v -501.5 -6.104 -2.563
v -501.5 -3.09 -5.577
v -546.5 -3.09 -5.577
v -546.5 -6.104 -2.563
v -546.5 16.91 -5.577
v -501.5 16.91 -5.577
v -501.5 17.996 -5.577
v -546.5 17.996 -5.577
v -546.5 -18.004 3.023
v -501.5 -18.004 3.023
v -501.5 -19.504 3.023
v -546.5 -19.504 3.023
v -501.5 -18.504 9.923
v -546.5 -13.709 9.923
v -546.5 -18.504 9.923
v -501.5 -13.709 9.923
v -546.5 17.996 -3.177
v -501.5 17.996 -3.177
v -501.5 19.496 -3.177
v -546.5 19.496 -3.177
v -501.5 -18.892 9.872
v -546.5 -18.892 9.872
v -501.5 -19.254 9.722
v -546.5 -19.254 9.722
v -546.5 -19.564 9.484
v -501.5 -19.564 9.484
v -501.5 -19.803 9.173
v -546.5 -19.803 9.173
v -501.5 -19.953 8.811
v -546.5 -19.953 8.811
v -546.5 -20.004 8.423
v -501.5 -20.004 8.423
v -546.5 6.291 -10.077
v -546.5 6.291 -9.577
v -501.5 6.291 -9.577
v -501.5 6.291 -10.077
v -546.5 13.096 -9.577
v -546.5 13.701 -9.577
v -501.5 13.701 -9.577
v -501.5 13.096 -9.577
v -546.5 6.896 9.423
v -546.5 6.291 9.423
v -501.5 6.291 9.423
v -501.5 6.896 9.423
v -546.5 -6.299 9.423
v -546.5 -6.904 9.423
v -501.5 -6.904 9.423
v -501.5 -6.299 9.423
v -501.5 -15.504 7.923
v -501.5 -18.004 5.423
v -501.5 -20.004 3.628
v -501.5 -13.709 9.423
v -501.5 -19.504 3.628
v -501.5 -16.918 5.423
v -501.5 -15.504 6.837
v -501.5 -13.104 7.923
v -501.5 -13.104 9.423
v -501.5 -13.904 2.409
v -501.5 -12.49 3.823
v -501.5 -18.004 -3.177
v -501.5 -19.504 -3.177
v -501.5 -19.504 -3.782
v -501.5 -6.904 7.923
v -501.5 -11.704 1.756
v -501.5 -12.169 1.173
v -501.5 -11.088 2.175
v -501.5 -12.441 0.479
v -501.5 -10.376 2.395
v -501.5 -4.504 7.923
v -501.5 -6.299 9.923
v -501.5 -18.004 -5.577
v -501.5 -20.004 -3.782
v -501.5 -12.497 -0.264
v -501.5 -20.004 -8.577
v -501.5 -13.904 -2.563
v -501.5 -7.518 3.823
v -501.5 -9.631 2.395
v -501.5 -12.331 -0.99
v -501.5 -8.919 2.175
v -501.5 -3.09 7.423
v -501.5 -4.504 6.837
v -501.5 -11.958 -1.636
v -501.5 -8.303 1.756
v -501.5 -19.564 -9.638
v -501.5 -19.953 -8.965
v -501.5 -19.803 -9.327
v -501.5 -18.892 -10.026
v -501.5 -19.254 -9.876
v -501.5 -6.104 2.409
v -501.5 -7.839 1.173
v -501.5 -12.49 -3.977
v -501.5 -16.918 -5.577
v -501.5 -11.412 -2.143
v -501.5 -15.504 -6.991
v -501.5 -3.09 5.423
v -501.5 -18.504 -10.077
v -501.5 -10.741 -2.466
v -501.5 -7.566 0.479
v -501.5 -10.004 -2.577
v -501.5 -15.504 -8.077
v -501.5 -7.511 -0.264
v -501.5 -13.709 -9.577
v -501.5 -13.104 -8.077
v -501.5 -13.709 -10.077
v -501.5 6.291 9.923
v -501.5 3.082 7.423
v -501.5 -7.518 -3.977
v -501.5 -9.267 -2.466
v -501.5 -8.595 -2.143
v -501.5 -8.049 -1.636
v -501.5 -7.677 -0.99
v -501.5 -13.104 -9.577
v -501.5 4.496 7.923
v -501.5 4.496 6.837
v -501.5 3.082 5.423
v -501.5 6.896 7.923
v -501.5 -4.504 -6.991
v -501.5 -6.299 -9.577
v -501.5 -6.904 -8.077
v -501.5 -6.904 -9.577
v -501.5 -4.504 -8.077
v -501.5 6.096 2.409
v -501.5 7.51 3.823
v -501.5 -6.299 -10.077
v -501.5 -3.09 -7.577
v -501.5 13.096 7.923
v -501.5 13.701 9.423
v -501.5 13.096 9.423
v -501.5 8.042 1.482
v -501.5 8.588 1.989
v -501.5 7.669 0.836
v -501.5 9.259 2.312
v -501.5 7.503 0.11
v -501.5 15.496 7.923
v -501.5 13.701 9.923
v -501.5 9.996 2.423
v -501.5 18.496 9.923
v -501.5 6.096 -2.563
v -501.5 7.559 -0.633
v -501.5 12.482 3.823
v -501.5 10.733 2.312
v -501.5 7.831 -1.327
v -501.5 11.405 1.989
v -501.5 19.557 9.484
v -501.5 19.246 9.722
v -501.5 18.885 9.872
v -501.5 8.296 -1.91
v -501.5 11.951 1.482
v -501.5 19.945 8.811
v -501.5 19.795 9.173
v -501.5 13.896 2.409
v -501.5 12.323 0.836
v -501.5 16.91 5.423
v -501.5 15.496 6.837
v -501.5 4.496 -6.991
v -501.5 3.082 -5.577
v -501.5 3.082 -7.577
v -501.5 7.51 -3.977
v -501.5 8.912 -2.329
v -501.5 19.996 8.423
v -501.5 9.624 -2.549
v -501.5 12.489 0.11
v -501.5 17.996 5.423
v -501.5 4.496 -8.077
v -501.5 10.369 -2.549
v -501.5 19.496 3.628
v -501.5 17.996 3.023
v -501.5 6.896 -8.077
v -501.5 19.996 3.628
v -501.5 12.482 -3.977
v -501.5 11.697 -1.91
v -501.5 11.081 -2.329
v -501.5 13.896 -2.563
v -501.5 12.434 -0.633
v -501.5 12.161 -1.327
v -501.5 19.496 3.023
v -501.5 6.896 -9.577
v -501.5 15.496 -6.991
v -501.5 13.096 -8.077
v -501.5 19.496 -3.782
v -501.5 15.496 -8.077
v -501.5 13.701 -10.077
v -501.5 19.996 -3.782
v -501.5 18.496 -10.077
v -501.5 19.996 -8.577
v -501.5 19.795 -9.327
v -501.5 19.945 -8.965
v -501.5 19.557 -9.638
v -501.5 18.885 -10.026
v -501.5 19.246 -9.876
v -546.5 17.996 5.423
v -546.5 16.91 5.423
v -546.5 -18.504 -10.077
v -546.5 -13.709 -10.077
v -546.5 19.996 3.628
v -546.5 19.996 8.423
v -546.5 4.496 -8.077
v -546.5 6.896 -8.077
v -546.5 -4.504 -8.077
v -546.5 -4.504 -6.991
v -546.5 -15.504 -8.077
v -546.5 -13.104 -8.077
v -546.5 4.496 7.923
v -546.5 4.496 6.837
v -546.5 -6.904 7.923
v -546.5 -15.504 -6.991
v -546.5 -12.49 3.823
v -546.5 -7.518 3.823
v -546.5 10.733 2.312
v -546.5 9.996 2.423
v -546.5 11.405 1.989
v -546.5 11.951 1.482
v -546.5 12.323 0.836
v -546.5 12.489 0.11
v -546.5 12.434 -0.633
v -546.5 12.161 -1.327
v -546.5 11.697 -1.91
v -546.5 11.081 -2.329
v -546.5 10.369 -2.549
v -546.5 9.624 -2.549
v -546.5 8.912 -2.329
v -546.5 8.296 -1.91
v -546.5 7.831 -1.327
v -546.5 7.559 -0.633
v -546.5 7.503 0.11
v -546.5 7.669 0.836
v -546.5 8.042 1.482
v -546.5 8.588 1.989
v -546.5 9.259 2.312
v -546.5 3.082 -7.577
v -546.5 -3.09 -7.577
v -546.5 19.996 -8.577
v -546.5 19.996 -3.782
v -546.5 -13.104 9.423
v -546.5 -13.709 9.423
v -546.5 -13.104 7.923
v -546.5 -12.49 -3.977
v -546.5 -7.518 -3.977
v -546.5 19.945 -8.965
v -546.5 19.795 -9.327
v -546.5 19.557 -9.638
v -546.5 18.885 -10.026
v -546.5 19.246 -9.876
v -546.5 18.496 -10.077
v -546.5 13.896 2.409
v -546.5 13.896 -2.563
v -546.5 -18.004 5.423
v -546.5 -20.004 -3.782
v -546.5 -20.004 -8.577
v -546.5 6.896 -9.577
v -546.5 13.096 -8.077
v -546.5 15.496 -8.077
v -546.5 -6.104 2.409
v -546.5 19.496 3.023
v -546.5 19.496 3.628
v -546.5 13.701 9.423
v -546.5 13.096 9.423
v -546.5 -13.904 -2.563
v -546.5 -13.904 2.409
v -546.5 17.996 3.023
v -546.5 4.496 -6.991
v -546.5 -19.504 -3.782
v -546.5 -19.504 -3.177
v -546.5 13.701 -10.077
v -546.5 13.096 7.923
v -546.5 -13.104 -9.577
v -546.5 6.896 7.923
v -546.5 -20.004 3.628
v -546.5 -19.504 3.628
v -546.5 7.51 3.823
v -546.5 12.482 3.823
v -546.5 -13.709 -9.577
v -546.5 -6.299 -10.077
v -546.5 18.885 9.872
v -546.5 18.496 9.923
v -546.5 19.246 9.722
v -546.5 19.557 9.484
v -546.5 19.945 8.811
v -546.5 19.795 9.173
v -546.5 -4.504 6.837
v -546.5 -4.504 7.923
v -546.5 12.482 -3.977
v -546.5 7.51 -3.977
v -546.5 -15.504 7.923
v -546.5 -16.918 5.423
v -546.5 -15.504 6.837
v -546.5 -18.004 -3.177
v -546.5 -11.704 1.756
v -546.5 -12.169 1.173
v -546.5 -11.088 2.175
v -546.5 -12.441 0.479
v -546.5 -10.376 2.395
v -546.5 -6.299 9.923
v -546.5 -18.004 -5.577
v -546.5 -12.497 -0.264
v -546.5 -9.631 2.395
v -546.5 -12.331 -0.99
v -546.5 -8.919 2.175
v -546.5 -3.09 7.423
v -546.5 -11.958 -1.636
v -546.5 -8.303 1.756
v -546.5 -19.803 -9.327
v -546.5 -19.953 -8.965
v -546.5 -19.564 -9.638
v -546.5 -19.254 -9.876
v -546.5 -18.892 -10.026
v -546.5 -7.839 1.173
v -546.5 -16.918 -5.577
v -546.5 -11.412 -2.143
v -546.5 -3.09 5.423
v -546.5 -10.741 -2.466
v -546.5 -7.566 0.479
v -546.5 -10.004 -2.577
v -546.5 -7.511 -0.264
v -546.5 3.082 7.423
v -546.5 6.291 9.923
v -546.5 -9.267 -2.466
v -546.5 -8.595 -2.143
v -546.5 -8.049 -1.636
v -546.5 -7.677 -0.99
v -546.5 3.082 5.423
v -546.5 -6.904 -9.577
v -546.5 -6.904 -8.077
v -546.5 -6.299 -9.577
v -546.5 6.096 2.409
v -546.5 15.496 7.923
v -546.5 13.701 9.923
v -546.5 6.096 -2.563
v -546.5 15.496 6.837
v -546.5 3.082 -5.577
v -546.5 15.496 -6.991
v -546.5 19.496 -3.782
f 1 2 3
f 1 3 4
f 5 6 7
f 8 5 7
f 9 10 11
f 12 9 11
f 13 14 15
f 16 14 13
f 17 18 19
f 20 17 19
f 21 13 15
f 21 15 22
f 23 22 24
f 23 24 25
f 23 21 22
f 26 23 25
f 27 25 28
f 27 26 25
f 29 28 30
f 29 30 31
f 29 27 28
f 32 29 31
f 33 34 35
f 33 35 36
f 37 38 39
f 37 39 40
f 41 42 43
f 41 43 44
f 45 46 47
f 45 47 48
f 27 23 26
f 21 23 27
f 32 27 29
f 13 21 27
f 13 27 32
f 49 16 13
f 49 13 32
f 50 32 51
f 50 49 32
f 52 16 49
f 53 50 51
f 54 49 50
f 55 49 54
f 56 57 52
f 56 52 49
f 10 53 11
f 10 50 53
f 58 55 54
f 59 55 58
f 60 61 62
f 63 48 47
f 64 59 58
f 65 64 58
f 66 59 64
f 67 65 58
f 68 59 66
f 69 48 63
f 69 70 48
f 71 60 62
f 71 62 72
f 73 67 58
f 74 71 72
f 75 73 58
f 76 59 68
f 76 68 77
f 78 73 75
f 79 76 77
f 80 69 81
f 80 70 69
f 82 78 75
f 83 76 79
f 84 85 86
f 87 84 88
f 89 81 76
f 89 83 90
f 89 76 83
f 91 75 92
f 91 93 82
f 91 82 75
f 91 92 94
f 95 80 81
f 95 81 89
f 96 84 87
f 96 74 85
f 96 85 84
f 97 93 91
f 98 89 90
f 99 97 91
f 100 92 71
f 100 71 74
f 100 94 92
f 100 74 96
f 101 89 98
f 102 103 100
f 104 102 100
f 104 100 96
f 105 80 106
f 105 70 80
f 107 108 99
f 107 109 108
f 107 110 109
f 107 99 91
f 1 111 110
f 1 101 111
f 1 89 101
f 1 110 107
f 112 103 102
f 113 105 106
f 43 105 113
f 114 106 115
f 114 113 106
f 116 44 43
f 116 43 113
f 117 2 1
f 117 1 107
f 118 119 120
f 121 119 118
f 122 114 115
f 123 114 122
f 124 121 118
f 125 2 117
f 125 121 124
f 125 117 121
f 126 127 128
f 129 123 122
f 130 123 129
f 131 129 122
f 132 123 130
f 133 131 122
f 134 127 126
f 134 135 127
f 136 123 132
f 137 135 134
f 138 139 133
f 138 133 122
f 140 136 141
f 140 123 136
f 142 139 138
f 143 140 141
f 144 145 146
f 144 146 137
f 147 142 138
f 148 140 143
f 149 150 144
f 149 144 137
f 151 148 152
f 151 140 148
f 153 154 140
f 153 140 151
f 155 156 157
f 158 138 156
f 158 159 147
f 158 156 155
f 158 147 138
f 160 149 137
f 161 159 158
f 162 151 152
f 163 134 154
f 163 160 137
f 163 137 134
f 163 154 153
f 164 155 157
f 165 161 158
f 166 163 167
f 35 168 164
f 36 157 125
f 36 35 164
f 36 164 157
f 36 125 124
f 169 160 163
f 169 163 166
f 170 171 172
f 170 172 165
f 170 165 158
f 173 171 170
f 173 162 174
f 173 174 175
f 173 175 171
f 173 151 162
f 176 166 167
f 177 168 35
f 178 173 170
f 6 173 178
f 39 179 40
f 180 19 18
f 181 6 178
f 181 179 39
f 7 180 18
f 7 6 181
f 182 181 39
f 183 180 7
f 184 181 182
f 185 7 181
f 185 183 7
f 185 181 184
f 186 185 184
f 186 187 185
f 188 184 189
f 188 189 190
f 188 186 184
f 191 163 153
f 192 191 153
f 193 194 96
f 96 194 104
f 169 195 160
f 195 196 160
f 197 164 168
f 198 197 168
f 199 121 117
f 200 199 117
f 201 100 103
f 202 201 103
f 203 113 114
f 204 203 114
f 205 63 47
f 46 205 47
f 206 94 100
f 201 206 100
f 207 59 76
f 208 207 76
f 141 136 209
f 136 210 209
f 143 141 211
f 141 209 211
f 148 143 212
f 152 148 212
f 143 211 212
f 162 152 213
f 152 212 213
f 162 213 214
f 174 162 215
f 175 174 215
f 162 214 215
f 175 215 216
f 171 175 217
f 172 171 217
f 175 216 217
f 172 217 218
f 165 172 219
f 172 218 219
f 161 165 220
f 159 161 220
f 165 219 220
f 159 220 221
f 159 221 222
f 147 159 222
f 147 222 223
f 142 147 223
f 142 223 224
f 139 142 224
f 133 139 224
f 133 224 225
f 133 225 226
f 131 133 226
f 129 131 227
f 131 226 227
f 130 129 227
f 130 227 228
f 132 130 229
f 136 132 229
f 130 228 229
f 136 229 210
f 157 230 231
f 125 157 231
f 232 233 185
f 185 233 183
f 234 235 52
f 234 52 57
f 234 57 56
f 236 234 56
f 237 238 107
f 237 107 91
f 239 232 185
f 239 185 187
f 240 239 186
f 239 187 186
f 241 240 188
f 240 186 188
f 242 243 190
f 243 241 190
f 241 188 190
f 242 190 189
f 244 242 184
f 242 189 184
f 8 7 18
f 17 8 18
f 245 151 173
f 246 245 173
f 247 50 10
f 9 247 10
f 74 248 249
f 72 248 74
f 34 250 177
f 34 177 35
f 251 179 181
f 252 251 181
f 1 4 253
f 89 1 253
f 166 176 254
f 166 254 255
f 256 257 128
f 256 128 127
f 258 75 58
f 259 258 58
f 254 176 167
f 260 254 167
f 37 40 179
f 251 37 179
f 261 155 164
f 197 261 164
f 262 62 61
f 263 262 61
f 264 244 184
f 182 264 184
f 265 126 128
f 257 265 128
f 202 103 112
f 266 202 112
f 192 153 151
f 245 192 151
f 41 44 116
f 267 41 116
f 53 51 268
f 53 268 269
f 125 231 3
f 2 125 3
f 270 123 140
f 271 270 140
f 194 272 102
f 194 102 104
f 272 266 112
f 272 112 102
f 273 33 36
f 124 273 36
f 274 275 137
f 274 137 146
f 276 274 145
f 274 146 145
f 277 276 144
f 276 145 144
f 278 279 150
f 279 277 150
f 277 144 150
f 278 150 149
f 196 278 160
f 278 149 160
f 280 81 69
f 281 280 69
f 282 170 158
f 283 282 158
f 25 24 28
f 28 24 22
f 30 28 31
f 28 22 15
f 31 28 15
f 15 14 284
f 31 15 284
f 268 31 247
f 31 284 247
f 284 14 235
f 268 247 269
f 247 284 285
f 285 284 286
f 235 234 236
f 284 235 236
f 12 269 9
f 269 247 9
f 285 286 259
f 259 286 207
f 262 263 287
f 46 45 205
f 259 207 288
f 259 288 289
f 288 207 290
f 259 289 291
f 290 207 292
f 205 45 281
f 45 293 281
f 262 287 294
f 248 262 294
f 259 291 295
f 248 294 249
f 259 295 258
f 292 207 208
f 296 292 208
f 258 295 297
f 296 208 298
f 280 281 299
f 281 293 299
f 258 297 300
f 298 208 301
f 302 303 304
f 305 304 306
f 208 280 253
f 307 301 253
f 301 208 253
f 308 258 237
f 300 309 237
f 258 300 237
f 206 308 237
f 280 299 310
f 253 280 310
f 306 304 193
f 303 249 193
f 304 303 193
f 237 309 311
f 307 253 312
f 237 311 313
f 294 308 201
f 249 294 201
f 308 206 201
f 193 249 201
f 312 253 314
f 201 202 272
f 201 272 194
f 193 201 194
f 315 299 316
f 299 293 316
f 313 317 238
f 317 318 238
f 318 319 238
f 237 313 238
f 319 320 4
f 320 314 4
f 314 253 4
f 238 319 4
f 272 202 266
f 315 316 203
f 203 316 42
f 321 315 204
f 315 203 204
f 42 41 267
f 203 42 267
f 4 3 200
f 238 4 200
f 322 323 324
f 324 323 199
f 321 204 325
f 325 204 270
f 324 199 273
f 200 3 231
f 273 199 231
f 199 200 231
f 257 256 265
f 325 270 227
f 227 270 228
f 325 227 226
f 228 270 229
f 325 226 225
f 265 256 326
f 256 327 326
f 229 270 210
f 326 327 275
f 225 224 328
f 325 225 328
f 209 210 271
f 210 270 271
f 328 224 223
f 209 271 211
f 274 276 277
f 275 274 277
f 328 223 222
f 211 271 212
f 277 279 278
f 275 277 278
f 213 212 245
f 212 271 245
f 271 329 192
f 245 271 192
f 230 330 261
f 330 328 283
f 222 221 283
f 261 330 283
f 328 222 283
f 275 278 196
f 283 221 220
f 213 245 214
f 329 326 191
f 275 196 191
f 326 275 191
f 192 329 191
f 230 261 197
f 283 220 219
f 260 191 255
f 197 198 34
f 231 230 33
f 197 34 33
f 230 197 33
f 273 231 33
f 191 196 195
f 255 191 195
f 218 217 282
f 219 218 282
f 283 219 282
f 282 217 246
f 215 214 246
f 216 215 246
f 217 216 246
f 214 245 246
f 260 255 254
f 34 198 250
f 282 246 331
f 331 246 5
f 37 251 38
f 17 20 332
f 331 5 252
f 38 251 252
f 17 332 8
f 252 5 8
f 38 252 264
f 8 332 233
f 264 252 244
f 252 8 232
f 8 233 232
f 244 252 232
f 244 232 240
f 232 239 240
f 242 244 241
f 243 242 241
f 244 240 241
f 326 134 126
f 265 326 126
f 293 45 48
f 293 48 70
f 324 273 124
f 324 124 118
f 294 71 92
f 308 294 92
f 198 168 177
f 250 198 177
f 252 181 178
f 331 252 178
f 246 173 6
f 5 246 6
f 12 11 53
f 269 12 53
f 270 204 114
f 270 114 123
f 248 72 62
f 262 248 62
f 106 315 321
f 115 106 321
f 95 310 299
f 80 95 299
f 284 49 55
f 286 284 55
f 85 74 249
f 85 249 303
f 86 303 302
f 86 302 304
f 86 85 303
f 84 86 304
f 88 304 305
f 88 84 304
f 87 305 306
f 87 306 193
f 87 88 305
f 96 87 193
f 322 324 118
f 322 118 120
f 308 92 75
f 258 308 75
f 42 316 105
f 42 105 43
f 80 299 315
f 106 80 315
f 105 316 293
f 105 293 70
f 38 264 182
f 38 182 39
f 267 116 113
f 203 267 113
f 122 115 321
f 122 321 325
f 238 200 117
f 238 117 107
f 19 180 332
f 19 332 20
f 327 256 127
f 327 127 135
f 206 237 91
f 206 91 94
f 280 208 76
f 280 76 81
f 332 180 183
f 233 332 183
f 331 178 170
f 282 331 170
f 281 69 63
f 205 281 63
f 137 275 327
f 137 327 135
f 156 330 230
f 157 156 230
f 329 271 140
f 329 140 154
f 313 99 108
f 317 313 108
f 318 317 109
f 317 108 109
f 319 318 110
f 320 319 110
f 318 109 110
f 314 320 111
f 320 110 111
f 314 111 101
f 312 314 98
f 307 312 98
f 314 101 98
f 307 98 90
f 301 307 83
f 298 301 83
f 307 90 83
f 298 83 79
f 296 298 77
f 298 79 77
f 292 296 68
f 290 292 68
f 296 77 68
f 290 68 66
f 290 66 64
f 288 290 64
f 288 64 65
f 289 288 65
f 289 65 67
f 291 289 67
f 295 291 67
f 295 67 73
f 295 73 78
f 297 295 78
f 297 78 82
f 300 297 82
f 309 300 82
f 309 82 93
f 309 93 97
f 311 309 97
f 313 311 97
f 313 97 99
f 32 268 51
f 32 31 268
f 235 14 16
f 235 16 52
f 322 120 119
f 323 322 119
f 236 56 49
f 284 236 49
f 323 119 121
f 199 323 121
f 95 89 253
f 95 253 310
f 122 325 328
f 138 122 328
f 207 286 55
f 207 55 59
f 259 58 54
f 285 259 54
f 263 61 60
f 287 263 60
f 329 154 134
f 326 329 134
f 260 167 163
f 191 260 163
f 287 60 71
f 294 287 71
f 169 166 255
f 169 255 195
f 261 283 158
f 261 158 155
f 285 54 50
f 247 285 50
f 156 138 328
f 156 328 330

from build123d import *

# Parameters (mm, degrees)
SKETCH_1_W                = 1048
SKETCH_1_H                = 40
EXTRUDE_1_DEPTH           = 20
CUT_EXTRUDE_1_DEPTH       = 1049.239330799
CUT_EXTRUDE_2_REACH       = 1050.811
CUT_EXTRUDE_3_REACH       = 1050.239
CUT_EXTRUDE_3_END_RADIUS  = 5
SKETCH_4_W                = 0.605
SKETCH_4_H                = 0.5
CUT_EXTRUDE_4_DEPTH       = 1049.239330799
CUT_EXTRUDE_5_DEPTH       = 1049.737119623
CUT_EXTRUDE_6_REACH       = 1050.239
CUT_EXTRUDE_6_END_RADIUS  = 5
SKETCH_7_W                = 0.605
SKETCH_7_H                = 0.5
CUT_EXTRUDE_7_REACH       = 1050.811
CUT_EXTRUDE_8_REACH       = 1050.239
CUT_EXTRUDE_8_END_RADIUS  = 5
SKETCH_9_W                = 0.605
SKETCH_9_H                = 0.5
CUT_EXTRUDE_9_REACH       = 1050.239
CUT_EXTRUDE_9_END_RADIUS  = 5
SKETCH_10_W               = 0.605
SKETCH_10_H               = 0.5
CUT_EXTRUDE_10_DEPTH      = 1049.737119623
CUT_EXTRUDE_11_REACH      = 1050.239
CUT_EXTRUDE_11_END_RADIUS = 5
SKETCH_12_W               = 0.605
SKETCH_12_H               = 0.5
CUT_EXTRUDE_12_DEPTH      = 1049.239330799
CUT_EXTRUDE_13_DEPTH      = 1049.239330799
CUT_EXTRUDE_14_REACH      = 1050.239
CUT_EXTRUDE_14_END_RADIUS = 5
SKETCH_15_W               = 0.605
SKETCH_15_H               = 0.5
CUT_EXTRUDE_15_REACH      = 1050.239
CUT_EXTRUDE_15_END_RADIUS = 5
SKETCH_16_W               = 0.605
SKETCH_16_H               = 0.5
CUT_EXTRUDE_16_DEPTH      = 1049.239330799
CUT_EXTRUDE_17_DEPTH      = 1049.239330799
CUT_EXTRUDE_18_REACH      = 1050.239
CUT_EXTRUDE_18_END_RADIUS = 5
SKETCH_19_W               = 0.605
SKETCH_19_H               = 0.5
CUT_EXTRUDE_19_DEPTH      = 1049.239330799
DRAFT_1_ANGLE             = 45
DRAFT_2_ANGLE             = 45
SKETCH_21_W               = 5
SKETCH_21_H               = 5.49122085
SKETCH_22_W               = 5
SKETCH_22_H               = 5.49864809
HOLE_WIZARD_5_0_5_1_D     = 4.999999999
HOLE_WIZARD_5_0_5_2_D     = 4.999999999
FILLET_1_R                = 1.5
SKETCH_27_W               = 25
SKETCH_27_H               = 45
CUT_EXTRUDE_21_DEPTH      = 501.5
CUT_EXTRUDE_START         = -1048
SKETCH_28_W               = 25
SKETCH_28_H               = 45
CUT_EXTRUDE_22_DEPTH      = 501.5


with BuildPart() as part:
    # 草图1 → 凸台-拉伸1 (new body)
    with BuildSketch(Plane.XY.offset(9.92299271)):
        with Locations((-524, -0.00371362)):
            Rectangle(SKETCH_1_W, SKETCH_1_H)
    extrude(amount=-EXTRUDE_1_DEPTH)

    # 草图2 → 切除-拉伸1 (cut, through all)
    with BuildSketch(Plane(origin=(0, 0, 0), x_dir=(0, 0, -1), z_dir=(1, 0, 0))):
        Polygon((-3.02299271, 19.99628638), (-3.02299271, 17.99628638), (-5.42299271, 17.99628638), (-5.42299271, 16.91049994), (-2.40877915, 13.89628638), (2.56279373, 13.89628638), (5.57700729, 16.91049994), (5.57700729, 17.99628638), (3.17700729, 17.99628638), (3.17700729, 19.99628638), align=None)
    extrude(amount=-CUT_EXTRUDE_1_DEPTH, mode=Mode.SUBTRACT)

    # 草图3 → 切除-拉伸2 (cut, up to next)
    with BuildSketch(Plane(origin=(0, 19.99628638, 0), x_dir=(-1, 0, 0), z_dir=(0, 1, 0)), mode=Mode.PRIVATE) as cut_extrude_2_sk1:
        with BuildLine():
            Line((9.017348236, 3.02299271), (16.982651764, 3.02299271))
            ThreePointArc((16.982651764, 3.02299271), (13, 5), (9.017348236, 3.02299271))
        make_face()
    cut_extrude_2_tool1 = extrude(cut_extrude_2_sk1.sketch, amount=-CUT_EXTRUDE_2_REACH, mode=Mode.PRIVATE) & part.part
    add(cut_extrude_2_tool1.solids().sort_by_distance((-13, 19.996286, 3.828944))[0], mode=Mode.SUBTRACT)

    # 切除-拉伸3: up to this cylinder (the profile starts outside it)
    cut_extrude_3_end = Plane(origin=(-13, 19.746286, 0), z_dir=(0, 1, 0)) * Cylinder(CUT_EXTRUDE_3_END_RADIUS, 2111.478, mode=Mode.PRIVATE)
    # 草图4 → 切除-拉伸3 (cut, up to the surface)
    with BuildSketch(Plane.ZY.offset(1048), mode=Mode.PRIVATE) as cut_extrude_3_sk1:
        with Locations((3.32549271, 19.74628638)):
            Rectangle(SKETCH_4_W, SKETCH_4_H)
    cut_extrude_3_tool1 = extrude(cut_extrude_3_sk1.sketch, amount=-CUT_EXTRUDE_3_REACH, mode=Mode.PRIVATE) - cut_extrude_3_end
    add(cut_extrude_3_tool1.solids().sort_by_distance((-1048, 19.746286, 3.325493))[0], mode=Mode.SUBTRACT)

    # 草图5 → 切除-拉伸4 (cut, through all)
    with BuildSketch(Plane(origin=(0, 0, 0), x_dir=(0, 0, -1), z_dir=(1, 0, 0))):
        Polygon((-3.02299271, -20.00371362), (3.17700729, -20.00371362), (3.17700729, -18.00371362), (5.57700729, -18.00371362), (5.57700729, -16.91792718), (2.56279373, -13.90371362), (-2.40877915, -13.90371362), (-5.42299271, -16.91792718), (-5.42299271, -18.00371362), (-3.02299271, -18.00371362), align=None)
    extrude(amount=-CUT_EXTRUDE_4_DEPTH, mode=Mode.SUBTRACT)

    # 草图6 → 切除-拉伸5 (cut, through all)
    with BuildSketch(Plane(origin=(0, -18.00371362, 0), x_dir=(-1, 0, 0), z_dir=(0, 1, 0))):
        with BuildLine():
            Line((9.017348236, 3.02299271), (16.982651764, 3.02299271))
            ThreePointArc((16.982651764, 3.02299271), (13, 5), (9.017348236, 3.02299271))
        make_face()
    extrude(amount=-CUT_EXTRUDE_5_DEPTH, mode=Mode.SUBTRACT)

    # 切除-拉伸6: up to this cylinder (the profile starts outside it)
    cut_extrude_6_end = Plane(origin=(-13, -19.753714, 0), z_dir=(0, 1, 0)) * Cylinder(CUT_EXTRUDE_6_END_RADIUS, 2111.478, mode=Mode.PRIVATE)
    # 草图7 → 切除-拉伸6 (cut, up to the surface)
    with BuildSketch(Plane.ZY.offset(1048), mode=Mode.PRIVATE) as cut_extrude_6_sk1:
        with Locations((3.32549271, -19.75371362)):
            Rectangle(SKETCH_7_W, SKETCH_7_H)
    cut_extrude_6_tool1 = extrude(cut_extrude_6_sk1.sketch, amount=-CUT_EXTRUDE_6_REACH, mode=Mode.PRIVATE) - cut_extrude_6_end
    add(cut_extrude_6_tool1.solids().sort_by_distance((-1048, -19.753714, 3.325493))[0], mode=Mode.SUBTRACT)

    # 草图8 → 切除-拉伸7 (cut, up to next)
    with BuildSketch(Plane.XZ.offset(20.00371362), mode=Mode.PRIVATE) as cut_extrude_7_sk1:
        with BuildLine():
            Line((-9.139090175, -3.17700729), (-16.860909825, -3.17700729))
            ThreePointArc((-16.860909825, -3.17700729), (-13, -5), (-9.139090175, -3.17700729))
        make_face()
    cut_extrude_7_tool1 = extrude(cut_extrude_7_sk1.sketch, amount=-CUT_EXTRUDE_7_REACH, mode=Mode.PRIVATE) & part.part
    add(cut_extrude_7_tool1.solids().sort_by_distance((-13, -20.003714, -3.918953))[0], mode=Mode.SUBTRACT)

    # 切除-拉伸8: up to this cylinder (the profile starts outside it)
    cut_extrude_8_end = Plane(origin=(-13, -19.753714, 0), z_dir=(0, -1, 0)) * Cylinder(CUT_EXTRUDE_8_END_RADIUS, 2111.478, mode=Mode.PRIVATE)
    # 草图9 → 切除-拉伸8 (cut, up to the surface)
    with BuildSketch(Plane.ZY.offset(1048), mode=Mode.PRIVATE) as cut_extrude_8_sk1:
        with Locations((-3.47950729, -19.75371362)):
            Rectangle(SKETCH_9_W, SKETCH_9_H)
    cut_extrude_8_tool1 = extrude(cut_extrude_8_sk1.sketch, amount=-CUT_EXTRUDE_8_REACH, mode=Mode.PRIVATE) - cut_extrude_8_end
    add(cut_extrude_8_tool1.solids().sort_by_distance((-1048, -19.753714, -3.479507))[0], mode=Mode.SUBTRACT)

    # 切除-拉伸9: up to this cylinder (the profile starts outside it)
    cut_extrude_9_end = Plane(origin=(-13, 19.746286, 0), z_dir=(0, 1, 0)) * Cylinder(CUT_EXTRUDE_9_END_RADIUS, 2111.478, mode=Mode.PRIVATE)
    # 草图10 → 切除-拉伸9 (cut, up to the surface)
    with BuildSketch(Plane(origin=(0, 0, 0), x_dir=(0, 0, -1), z_dir=(1, 0, 0)), mode=Mode.PRIVATE) as cut_extrude_9_sk1:
        with Locations((-3.32549271, 19.74628638)):
            Rectangle(SKETCH_10_W, SKETCH_10_H)
    cut_extrude_9_tool1 = extrude(cut_extrude_9_sk1.sketch, amount=-CUT_EXTRUDE_9_REACH, mode=Mode.PRIVATE) - cut_extrude_9_end
    add(cut_extrude_9_tool1.solids().sort_by_distance((0, 19.746286, 3.325493))[0], mode=Mode.SUBTRACT)

    # 草图11 → 切除-拉伸10 (cut, through all)
    with BuildSketch(Plane.XZ.offset(-17.99628638)):
        with BuildLine():
            Line((-9.139090175, -3.17700729), (-16.860909825, -3.17700729))
            ThreePointArc((-16.860909825, -3.17700729), (-13, -5), (-9.139090175, -3.17700729))
        make_face()
    extrude(amount=-CUT_EXTRUDE_10_DEPTH, mode=Mode.SUBTRACT)

    # 切除-拉伸11: up to this cylinder (the profile starts outside it)
    cut_extrude_11_end = Plane(origin=(-13, 19.746286, 0), z_dir=(0, -1, 0)) * Cylinder(CUT_EXTRUDE_11_END_RADIUS, 2111.478, mode=Mode.PRIVATE)
    # 草图12 → 切除-拉伸11 (cut, up to the surface)
    with BuildSketch(Plane(origin=(0, 0, 0), x_dir=(0, 0, -1), z_dir=(1, 0, 0)), mode=Mode.PRIVATE) as cut_extrude_11_sk1:
        with Locations((3.47950729, 19.74628638)):
            Rectangle(SKETCH_12_W, SKETCH_12_H)
    cut_extrude_11_tool1 = extrude(cut_extrude_11_sk1.sketch, amount=-CUT_EXTRUDE_11_REACH, mode=Mode.PRIVATE) - cut_extrude_11_end
    add(cut_extrude_11_tool1.solids().sort_by_distance((0, 19.746286, -3.479507))[0], mode=Mode.SUBTRACT)

    # 草图13 → 切除-拉伸12 (cut, through all)
    with BuildSketch(Plane(origin=(0, 0, 0), x_dir=(0, 0, -1), z_dir=(1, 0, 0))):
        Polygon((10.07700729, 13.70128638), (9.57700729, 13.70128638), (9.57700729, 13.09628638), (8.07700729, 13.09628638), (8.07700729, 15.49628638), (6.99122085, 15.49628638), (3.97700729, 12.48207282), (3.97700729, 7.51049994), (6.99122085, 4.49628638), (8.07700729, 4.49628638), (8.07700729, 6.89628638), (9.57700729, 6.89628638), (9.57700729, 6.29128638), (10.07700729, 6.29128638), align=None)
    extrude(amount=-CUT_EXTRUDE_12_DEPTH, mode=Mode.SUBTRACT)

    # 草图14 → 切除-拉伸13 (cut, through all)
    with BuildSketch(Plane(origin=(0, 0, 0), x_dir=(0, 0, -1), z_dir=(1, 0, 0))):
        Polygon((10.07700729, -6.29871362), (9.57700729, -6.29871362), (9.57700729, -6.90371362), (8.07700729, -6.90371362), (8.07700729, -4.50371362), (6.99122085, -4.50371362), (3.97700729, -7.51792718), (3.97700729, -12.48950006), (6.99122085, -15.50371362), (8.07700729, -15.50371362), (8.07700729, -13.10371362), (9.57700729, -13.10371362), (9.57700729, -13.70871362), (10.07700729, -13.70871362), align=None)
    extrude(amount=-CUT_EXTRUDE_13_DEPTH, mode=Mode.SUBTRACT)

    # 切除-拉伸14: up to this cylinder (the profile starts outside it)
    cut_extrude_14_end = Plane(origin=(-13, -19.753714, 0), z_dir=(0, -1, 0)) * Cylinder(CUT_EXTRUDE_14_END_RADIUS, 2111.478, mode=Mode.PRIVATE)
    # 草图15 → 切除-拉伸14 (cut, up to the surface)
    with BuildSketch(Plane(origin=(0, 0, 0), x_dir=(0, 0, -1), z_dir=(1, 0, 0)), mode=Mode.PRIVATE) as cut_extrude_14_sk1:
        with Locations((3.47950729, -19.75371362)):
            Rectangle(SKETCH_15_W, SKETCH_15_H)
    cut_extrude_14_tool1 = extrude(cut_extrude_14_sk1.sketch, amount=-CUT_EXTRUDE_14_REACH, mode=Mode.PRIVATE) - cut_extrude_14_end
    add(cut_extrude_14_tool1.solids().sort_by_distance((0, -19.753714, -3.479507))[0], mode=Mode.SUBTRACT)

    # 切除-拉伸15: up to this cylinder (the profile starts outside it)
    cut_extrude_15_end = Plane(origin=(-13, -19.753714, 0), z_dir=(0, 1, 0)) * Cylinder(CUT_EXTRUDE_15_END_RADIUS, 2111.478, mode=Mode.PRIVATE)
    # 草图16 → 切除-拉伸15 (cut, up to the surface)
    with BuildSketch(Plane(origin=(0, 0, 0), x_dir=(0, 0, -1), z_dir=(1, 0, 0)), mode=Mode.PRIVATE) as cut_extrude_15_sk1:
        with Locations((-3.32549271, -19.75371362)):
            Rectangle(SKETCH_16_W, SKETCH_16_H)
    cut_extrude_15_tool1 = extrude(cut_extrude_15_sk1.sketch, amount=-CUT_EXTRUDE_15_REACH, mode=Mode.PRIVATE) - cut_extrude_15_end
    add(cut_extrude_15_tool1.solids().sort_by_distance((0, -19.753714, 3.325493))[0], mode=Mode.SUBTRACT)

    # 草图17 → 切除-拉伸16 (cut, through all)
    with BuildSketch(Plane(origin=(0, 0, 0), x_dir=(0, 0, -1), z_dir=(1, 0, 0))):
        Polygon((-9.92299271, -13.70871362), (-9.42299271, -13.70871362), (-9.42299271, -13.10371362), (-7.92299271, -13.10371362), (-7.92299271, -15.50371362), (-6.83720627, -15.50371362), (-3.82299271, -12.48950006), (-3.82299271, -7.51792718), (-6.83720627, -4.50371362), (-7.92299271, -4.50371362), (-7.92299271, -6.90371362), (-9.42299271, -6.90371362), (-9.42299271, -6.29871362), (-9.92299271, -6.29871362), align=None)
    extrude(amount=-CUT_EXTRUDE_16_DEPTH, mode=Mode.SUBTRACT)

    # 草图18 → 切除-拉伸17 (cut, through all)
    with BuildSketch(Plane(origin=(0, 0, 0), x_dir=(0, 0, -1), z_dir=(1, 0, 0))):
        Polygon((-9.92299271, 6.29128638), (-9.42299271, 6.29128638), (-9.42299271, 6.89628638), (-7.92299271, 6.89628638), (-7.92299271, 4.49628638), (-6.83720627, 4.49628638), (-3.82299271, 7.51049994), (-3.82299271, 12.48207282), (-6.83720627, 15.49628638), (-7.92299271, 15.49628638), (-7.92299271, 13.09628638), (-9.42299271, 13.09628638), (-9.42299271, 13.70128638), (-9.92299271, 13.70128638), align=None)
    extrude(amount=-CUT_EXTRUDE_17_DEPTH, mode=Mode.SUBTRACT)

    # 切除-拉伸18: up to this cylinder (the profile starts outside it)
    cut_extrude_18_end = Plane(origin=(-13, 19.746286, 0), z_dir=(0, -1, 0)) * Cylinder(CUT_EXTRUDE_18_END_RADIUS, 2111.478, mode=Mode.PRIVATE)
    # 草图19 → 切除-拉伸18 (cut, up to the surface)
    with BuildSketch(Plane.ZY.offset(1048), mode=Mode.PRIVATE) as cut_extrude_18_sk1:
        with Locations((-3.47950729, 19.74628638)):
            Rectangle(SKETCH_19_W, SKETCH_19_H)
    cut_extrude_18_tool1 = extrude(cut_extrude_18_sk1.sketch, amount=-CUT_EXTRUDE_18_REACH, mode=Mode.PRIVATE) - cut_extrude_18_end
    add(cut_extrude_18_tool1.solids().sort_by_distance((-1048, 19.746286, -3.479507))[0], mode=Mode.SUBTRACT)

    # 草图20 → 切除-拉伸19 (cut, through all)
    with BuildSketch(Plane.ZY.offset(1048)):
        Polygon((2.40877915, -3.08950006), (7.42299271, -3.08950006), (7.42299271, 3.08207282), (2.40877915, 3.08207282), (2.40877915, 6.09628638), (-2.56279373, 6.09628638), (-2.56279373, 3.08207282), (-7.57700729, 3.08207282), (-7.57700729, -3.08950006), (-2.56279373, -3.08950006), (-2.56279373, -6.10371362), (2.40877915, -6.10371362), align=None)
    extrude(amount=-CUT_EXTRUDE_19_DEPTH, mode=Mode.SUBTRACT)

    # 拔模1
    draft_1_faces = [part.faces().sort_by_distance(p)[0] for p in [
        (-524, -4.59660684, 2.40877915),
        (-524, -4.59660684, -2.56279373),
    ]]
    draft(draft_1_faces, Plane(origin=(0, -6.10371362, -2.56279373), x_dir=(0, 0, 1), z_dir=(0, 1, 0)), DRAFT_1_ANGLE)

    # 拔模2
    draft_2_faces = [part.faces().sort_by_distance(p)[0] for p in [
        (-524, 4.5891796, -2.56279373),
        (-524, 4.5891796, 2.40877915),
    ]]
    draft(draft_2_faces, Plane(origin=(0, 6.09628638, 2.40877915), x_dir=(0, 0, -1), z_dir=(0, -1, 0)), DRAFT_2_ANGLE)

    # 草图21 → 切除-旋转1 (revolve, cut)
    with BuildSketch(Plane(origin=(0, 0, 0), x_dir=(-1, 0, 0), z_dir=(0, 0, -1)), mode=Mode.PRIVATE) as cut_revolve_1_sk:
        with Locations((10.5, 13.741896805)):
            Rectangle(SKETCH_21_W, SKETCH_21_H)
    revolve(cut_revolve_1_sk.sketch.rotate(Axis((-13, 10.99628638, 0), (0, 1, 0)), 229.871289748), axis=Axis((-13, 10.99628638, 0), (0, 1, 0)), mode=Mode.SUBTRACT)

    # 草图22 → 切除-旋转2 (revolve, cut)
    with BuildSketch(Plane.XY, mode=Mode.PRIVATE) as cut_revolve_2_sk:
        with Locations((-10.5, -13.745610425)):
            Rectangle(SKETCH_22_W, SKETCH_22_H)
    revolve(cut_revolve_2_sk.sketch.rotate(Axis((-13, -10.99628638, 0), (0, -1, 0)), 232.693190821), axis=Axis((-13, -10.99628638, 0), (0, -1, 0)), mode=Mode.SUBTRACT)

    # Ø5.0 (5) 直径孔1 (through all)
    with Locations(Plane(origin=(0, 0, 0), x_dir=(0, 0, -1), z_dir=(1, 0, 0))):
        with Locations((0.07700729, 9.99628638)):
            Hole(HOLE_WIZARD_5_0_5_1_D / 2)

    # Ø5.0 (5) 直径孔2 (through all)
    with Locations(Plane.ZY.offset(1048)):
        with Locations((-0.07700729, -10.00371362)):
            Hole(HOLE_WIZARD_5_0_5_2_D / 2)

    # 圆角1
    fillet_1_edges = [part.edges().sort_by_distance(p)[0] for p in [
        (-524, -20.00371362, -10.07700729),
        (-524, 19.99628638, -10.07700729),
        (-524, -20.00371362, 9.92299271),
        (-524, 19.99628638, 9.92299271),
    ]]
    fillet(fillet_1_edges, radius=FILLET_1_R)

    # 草图27 → 切除-拉伸21 (cut)
    with BuildSketch(Plane(origin=(0, 0, 0), x_dir=(0, 0, -1), z_dir=(1, 0, 0))):
        Rectangle(SKETCH_27_W, SKETCH_27_H)
    extrude(amount=-CUT_EXTRUDE_21_DEPTH, mode=Mode.SUBTRACT)

    # 草图28 → 切除-拉伸22 (cut)
    with BuildSketch(Plane(origin=(0, 0, 0), x_dir=(0, 0, -1), z_dir=(1, 0, 0)).offset(CUT_EXTRUDE_START)):
        Rectangle(SKETCH_28_W, SKETCH_28_H)
    extrude(amount=CUT_EXTRUDE_22_DEPTH, mode=Mode.SUBTRACT)


solid = part.part
